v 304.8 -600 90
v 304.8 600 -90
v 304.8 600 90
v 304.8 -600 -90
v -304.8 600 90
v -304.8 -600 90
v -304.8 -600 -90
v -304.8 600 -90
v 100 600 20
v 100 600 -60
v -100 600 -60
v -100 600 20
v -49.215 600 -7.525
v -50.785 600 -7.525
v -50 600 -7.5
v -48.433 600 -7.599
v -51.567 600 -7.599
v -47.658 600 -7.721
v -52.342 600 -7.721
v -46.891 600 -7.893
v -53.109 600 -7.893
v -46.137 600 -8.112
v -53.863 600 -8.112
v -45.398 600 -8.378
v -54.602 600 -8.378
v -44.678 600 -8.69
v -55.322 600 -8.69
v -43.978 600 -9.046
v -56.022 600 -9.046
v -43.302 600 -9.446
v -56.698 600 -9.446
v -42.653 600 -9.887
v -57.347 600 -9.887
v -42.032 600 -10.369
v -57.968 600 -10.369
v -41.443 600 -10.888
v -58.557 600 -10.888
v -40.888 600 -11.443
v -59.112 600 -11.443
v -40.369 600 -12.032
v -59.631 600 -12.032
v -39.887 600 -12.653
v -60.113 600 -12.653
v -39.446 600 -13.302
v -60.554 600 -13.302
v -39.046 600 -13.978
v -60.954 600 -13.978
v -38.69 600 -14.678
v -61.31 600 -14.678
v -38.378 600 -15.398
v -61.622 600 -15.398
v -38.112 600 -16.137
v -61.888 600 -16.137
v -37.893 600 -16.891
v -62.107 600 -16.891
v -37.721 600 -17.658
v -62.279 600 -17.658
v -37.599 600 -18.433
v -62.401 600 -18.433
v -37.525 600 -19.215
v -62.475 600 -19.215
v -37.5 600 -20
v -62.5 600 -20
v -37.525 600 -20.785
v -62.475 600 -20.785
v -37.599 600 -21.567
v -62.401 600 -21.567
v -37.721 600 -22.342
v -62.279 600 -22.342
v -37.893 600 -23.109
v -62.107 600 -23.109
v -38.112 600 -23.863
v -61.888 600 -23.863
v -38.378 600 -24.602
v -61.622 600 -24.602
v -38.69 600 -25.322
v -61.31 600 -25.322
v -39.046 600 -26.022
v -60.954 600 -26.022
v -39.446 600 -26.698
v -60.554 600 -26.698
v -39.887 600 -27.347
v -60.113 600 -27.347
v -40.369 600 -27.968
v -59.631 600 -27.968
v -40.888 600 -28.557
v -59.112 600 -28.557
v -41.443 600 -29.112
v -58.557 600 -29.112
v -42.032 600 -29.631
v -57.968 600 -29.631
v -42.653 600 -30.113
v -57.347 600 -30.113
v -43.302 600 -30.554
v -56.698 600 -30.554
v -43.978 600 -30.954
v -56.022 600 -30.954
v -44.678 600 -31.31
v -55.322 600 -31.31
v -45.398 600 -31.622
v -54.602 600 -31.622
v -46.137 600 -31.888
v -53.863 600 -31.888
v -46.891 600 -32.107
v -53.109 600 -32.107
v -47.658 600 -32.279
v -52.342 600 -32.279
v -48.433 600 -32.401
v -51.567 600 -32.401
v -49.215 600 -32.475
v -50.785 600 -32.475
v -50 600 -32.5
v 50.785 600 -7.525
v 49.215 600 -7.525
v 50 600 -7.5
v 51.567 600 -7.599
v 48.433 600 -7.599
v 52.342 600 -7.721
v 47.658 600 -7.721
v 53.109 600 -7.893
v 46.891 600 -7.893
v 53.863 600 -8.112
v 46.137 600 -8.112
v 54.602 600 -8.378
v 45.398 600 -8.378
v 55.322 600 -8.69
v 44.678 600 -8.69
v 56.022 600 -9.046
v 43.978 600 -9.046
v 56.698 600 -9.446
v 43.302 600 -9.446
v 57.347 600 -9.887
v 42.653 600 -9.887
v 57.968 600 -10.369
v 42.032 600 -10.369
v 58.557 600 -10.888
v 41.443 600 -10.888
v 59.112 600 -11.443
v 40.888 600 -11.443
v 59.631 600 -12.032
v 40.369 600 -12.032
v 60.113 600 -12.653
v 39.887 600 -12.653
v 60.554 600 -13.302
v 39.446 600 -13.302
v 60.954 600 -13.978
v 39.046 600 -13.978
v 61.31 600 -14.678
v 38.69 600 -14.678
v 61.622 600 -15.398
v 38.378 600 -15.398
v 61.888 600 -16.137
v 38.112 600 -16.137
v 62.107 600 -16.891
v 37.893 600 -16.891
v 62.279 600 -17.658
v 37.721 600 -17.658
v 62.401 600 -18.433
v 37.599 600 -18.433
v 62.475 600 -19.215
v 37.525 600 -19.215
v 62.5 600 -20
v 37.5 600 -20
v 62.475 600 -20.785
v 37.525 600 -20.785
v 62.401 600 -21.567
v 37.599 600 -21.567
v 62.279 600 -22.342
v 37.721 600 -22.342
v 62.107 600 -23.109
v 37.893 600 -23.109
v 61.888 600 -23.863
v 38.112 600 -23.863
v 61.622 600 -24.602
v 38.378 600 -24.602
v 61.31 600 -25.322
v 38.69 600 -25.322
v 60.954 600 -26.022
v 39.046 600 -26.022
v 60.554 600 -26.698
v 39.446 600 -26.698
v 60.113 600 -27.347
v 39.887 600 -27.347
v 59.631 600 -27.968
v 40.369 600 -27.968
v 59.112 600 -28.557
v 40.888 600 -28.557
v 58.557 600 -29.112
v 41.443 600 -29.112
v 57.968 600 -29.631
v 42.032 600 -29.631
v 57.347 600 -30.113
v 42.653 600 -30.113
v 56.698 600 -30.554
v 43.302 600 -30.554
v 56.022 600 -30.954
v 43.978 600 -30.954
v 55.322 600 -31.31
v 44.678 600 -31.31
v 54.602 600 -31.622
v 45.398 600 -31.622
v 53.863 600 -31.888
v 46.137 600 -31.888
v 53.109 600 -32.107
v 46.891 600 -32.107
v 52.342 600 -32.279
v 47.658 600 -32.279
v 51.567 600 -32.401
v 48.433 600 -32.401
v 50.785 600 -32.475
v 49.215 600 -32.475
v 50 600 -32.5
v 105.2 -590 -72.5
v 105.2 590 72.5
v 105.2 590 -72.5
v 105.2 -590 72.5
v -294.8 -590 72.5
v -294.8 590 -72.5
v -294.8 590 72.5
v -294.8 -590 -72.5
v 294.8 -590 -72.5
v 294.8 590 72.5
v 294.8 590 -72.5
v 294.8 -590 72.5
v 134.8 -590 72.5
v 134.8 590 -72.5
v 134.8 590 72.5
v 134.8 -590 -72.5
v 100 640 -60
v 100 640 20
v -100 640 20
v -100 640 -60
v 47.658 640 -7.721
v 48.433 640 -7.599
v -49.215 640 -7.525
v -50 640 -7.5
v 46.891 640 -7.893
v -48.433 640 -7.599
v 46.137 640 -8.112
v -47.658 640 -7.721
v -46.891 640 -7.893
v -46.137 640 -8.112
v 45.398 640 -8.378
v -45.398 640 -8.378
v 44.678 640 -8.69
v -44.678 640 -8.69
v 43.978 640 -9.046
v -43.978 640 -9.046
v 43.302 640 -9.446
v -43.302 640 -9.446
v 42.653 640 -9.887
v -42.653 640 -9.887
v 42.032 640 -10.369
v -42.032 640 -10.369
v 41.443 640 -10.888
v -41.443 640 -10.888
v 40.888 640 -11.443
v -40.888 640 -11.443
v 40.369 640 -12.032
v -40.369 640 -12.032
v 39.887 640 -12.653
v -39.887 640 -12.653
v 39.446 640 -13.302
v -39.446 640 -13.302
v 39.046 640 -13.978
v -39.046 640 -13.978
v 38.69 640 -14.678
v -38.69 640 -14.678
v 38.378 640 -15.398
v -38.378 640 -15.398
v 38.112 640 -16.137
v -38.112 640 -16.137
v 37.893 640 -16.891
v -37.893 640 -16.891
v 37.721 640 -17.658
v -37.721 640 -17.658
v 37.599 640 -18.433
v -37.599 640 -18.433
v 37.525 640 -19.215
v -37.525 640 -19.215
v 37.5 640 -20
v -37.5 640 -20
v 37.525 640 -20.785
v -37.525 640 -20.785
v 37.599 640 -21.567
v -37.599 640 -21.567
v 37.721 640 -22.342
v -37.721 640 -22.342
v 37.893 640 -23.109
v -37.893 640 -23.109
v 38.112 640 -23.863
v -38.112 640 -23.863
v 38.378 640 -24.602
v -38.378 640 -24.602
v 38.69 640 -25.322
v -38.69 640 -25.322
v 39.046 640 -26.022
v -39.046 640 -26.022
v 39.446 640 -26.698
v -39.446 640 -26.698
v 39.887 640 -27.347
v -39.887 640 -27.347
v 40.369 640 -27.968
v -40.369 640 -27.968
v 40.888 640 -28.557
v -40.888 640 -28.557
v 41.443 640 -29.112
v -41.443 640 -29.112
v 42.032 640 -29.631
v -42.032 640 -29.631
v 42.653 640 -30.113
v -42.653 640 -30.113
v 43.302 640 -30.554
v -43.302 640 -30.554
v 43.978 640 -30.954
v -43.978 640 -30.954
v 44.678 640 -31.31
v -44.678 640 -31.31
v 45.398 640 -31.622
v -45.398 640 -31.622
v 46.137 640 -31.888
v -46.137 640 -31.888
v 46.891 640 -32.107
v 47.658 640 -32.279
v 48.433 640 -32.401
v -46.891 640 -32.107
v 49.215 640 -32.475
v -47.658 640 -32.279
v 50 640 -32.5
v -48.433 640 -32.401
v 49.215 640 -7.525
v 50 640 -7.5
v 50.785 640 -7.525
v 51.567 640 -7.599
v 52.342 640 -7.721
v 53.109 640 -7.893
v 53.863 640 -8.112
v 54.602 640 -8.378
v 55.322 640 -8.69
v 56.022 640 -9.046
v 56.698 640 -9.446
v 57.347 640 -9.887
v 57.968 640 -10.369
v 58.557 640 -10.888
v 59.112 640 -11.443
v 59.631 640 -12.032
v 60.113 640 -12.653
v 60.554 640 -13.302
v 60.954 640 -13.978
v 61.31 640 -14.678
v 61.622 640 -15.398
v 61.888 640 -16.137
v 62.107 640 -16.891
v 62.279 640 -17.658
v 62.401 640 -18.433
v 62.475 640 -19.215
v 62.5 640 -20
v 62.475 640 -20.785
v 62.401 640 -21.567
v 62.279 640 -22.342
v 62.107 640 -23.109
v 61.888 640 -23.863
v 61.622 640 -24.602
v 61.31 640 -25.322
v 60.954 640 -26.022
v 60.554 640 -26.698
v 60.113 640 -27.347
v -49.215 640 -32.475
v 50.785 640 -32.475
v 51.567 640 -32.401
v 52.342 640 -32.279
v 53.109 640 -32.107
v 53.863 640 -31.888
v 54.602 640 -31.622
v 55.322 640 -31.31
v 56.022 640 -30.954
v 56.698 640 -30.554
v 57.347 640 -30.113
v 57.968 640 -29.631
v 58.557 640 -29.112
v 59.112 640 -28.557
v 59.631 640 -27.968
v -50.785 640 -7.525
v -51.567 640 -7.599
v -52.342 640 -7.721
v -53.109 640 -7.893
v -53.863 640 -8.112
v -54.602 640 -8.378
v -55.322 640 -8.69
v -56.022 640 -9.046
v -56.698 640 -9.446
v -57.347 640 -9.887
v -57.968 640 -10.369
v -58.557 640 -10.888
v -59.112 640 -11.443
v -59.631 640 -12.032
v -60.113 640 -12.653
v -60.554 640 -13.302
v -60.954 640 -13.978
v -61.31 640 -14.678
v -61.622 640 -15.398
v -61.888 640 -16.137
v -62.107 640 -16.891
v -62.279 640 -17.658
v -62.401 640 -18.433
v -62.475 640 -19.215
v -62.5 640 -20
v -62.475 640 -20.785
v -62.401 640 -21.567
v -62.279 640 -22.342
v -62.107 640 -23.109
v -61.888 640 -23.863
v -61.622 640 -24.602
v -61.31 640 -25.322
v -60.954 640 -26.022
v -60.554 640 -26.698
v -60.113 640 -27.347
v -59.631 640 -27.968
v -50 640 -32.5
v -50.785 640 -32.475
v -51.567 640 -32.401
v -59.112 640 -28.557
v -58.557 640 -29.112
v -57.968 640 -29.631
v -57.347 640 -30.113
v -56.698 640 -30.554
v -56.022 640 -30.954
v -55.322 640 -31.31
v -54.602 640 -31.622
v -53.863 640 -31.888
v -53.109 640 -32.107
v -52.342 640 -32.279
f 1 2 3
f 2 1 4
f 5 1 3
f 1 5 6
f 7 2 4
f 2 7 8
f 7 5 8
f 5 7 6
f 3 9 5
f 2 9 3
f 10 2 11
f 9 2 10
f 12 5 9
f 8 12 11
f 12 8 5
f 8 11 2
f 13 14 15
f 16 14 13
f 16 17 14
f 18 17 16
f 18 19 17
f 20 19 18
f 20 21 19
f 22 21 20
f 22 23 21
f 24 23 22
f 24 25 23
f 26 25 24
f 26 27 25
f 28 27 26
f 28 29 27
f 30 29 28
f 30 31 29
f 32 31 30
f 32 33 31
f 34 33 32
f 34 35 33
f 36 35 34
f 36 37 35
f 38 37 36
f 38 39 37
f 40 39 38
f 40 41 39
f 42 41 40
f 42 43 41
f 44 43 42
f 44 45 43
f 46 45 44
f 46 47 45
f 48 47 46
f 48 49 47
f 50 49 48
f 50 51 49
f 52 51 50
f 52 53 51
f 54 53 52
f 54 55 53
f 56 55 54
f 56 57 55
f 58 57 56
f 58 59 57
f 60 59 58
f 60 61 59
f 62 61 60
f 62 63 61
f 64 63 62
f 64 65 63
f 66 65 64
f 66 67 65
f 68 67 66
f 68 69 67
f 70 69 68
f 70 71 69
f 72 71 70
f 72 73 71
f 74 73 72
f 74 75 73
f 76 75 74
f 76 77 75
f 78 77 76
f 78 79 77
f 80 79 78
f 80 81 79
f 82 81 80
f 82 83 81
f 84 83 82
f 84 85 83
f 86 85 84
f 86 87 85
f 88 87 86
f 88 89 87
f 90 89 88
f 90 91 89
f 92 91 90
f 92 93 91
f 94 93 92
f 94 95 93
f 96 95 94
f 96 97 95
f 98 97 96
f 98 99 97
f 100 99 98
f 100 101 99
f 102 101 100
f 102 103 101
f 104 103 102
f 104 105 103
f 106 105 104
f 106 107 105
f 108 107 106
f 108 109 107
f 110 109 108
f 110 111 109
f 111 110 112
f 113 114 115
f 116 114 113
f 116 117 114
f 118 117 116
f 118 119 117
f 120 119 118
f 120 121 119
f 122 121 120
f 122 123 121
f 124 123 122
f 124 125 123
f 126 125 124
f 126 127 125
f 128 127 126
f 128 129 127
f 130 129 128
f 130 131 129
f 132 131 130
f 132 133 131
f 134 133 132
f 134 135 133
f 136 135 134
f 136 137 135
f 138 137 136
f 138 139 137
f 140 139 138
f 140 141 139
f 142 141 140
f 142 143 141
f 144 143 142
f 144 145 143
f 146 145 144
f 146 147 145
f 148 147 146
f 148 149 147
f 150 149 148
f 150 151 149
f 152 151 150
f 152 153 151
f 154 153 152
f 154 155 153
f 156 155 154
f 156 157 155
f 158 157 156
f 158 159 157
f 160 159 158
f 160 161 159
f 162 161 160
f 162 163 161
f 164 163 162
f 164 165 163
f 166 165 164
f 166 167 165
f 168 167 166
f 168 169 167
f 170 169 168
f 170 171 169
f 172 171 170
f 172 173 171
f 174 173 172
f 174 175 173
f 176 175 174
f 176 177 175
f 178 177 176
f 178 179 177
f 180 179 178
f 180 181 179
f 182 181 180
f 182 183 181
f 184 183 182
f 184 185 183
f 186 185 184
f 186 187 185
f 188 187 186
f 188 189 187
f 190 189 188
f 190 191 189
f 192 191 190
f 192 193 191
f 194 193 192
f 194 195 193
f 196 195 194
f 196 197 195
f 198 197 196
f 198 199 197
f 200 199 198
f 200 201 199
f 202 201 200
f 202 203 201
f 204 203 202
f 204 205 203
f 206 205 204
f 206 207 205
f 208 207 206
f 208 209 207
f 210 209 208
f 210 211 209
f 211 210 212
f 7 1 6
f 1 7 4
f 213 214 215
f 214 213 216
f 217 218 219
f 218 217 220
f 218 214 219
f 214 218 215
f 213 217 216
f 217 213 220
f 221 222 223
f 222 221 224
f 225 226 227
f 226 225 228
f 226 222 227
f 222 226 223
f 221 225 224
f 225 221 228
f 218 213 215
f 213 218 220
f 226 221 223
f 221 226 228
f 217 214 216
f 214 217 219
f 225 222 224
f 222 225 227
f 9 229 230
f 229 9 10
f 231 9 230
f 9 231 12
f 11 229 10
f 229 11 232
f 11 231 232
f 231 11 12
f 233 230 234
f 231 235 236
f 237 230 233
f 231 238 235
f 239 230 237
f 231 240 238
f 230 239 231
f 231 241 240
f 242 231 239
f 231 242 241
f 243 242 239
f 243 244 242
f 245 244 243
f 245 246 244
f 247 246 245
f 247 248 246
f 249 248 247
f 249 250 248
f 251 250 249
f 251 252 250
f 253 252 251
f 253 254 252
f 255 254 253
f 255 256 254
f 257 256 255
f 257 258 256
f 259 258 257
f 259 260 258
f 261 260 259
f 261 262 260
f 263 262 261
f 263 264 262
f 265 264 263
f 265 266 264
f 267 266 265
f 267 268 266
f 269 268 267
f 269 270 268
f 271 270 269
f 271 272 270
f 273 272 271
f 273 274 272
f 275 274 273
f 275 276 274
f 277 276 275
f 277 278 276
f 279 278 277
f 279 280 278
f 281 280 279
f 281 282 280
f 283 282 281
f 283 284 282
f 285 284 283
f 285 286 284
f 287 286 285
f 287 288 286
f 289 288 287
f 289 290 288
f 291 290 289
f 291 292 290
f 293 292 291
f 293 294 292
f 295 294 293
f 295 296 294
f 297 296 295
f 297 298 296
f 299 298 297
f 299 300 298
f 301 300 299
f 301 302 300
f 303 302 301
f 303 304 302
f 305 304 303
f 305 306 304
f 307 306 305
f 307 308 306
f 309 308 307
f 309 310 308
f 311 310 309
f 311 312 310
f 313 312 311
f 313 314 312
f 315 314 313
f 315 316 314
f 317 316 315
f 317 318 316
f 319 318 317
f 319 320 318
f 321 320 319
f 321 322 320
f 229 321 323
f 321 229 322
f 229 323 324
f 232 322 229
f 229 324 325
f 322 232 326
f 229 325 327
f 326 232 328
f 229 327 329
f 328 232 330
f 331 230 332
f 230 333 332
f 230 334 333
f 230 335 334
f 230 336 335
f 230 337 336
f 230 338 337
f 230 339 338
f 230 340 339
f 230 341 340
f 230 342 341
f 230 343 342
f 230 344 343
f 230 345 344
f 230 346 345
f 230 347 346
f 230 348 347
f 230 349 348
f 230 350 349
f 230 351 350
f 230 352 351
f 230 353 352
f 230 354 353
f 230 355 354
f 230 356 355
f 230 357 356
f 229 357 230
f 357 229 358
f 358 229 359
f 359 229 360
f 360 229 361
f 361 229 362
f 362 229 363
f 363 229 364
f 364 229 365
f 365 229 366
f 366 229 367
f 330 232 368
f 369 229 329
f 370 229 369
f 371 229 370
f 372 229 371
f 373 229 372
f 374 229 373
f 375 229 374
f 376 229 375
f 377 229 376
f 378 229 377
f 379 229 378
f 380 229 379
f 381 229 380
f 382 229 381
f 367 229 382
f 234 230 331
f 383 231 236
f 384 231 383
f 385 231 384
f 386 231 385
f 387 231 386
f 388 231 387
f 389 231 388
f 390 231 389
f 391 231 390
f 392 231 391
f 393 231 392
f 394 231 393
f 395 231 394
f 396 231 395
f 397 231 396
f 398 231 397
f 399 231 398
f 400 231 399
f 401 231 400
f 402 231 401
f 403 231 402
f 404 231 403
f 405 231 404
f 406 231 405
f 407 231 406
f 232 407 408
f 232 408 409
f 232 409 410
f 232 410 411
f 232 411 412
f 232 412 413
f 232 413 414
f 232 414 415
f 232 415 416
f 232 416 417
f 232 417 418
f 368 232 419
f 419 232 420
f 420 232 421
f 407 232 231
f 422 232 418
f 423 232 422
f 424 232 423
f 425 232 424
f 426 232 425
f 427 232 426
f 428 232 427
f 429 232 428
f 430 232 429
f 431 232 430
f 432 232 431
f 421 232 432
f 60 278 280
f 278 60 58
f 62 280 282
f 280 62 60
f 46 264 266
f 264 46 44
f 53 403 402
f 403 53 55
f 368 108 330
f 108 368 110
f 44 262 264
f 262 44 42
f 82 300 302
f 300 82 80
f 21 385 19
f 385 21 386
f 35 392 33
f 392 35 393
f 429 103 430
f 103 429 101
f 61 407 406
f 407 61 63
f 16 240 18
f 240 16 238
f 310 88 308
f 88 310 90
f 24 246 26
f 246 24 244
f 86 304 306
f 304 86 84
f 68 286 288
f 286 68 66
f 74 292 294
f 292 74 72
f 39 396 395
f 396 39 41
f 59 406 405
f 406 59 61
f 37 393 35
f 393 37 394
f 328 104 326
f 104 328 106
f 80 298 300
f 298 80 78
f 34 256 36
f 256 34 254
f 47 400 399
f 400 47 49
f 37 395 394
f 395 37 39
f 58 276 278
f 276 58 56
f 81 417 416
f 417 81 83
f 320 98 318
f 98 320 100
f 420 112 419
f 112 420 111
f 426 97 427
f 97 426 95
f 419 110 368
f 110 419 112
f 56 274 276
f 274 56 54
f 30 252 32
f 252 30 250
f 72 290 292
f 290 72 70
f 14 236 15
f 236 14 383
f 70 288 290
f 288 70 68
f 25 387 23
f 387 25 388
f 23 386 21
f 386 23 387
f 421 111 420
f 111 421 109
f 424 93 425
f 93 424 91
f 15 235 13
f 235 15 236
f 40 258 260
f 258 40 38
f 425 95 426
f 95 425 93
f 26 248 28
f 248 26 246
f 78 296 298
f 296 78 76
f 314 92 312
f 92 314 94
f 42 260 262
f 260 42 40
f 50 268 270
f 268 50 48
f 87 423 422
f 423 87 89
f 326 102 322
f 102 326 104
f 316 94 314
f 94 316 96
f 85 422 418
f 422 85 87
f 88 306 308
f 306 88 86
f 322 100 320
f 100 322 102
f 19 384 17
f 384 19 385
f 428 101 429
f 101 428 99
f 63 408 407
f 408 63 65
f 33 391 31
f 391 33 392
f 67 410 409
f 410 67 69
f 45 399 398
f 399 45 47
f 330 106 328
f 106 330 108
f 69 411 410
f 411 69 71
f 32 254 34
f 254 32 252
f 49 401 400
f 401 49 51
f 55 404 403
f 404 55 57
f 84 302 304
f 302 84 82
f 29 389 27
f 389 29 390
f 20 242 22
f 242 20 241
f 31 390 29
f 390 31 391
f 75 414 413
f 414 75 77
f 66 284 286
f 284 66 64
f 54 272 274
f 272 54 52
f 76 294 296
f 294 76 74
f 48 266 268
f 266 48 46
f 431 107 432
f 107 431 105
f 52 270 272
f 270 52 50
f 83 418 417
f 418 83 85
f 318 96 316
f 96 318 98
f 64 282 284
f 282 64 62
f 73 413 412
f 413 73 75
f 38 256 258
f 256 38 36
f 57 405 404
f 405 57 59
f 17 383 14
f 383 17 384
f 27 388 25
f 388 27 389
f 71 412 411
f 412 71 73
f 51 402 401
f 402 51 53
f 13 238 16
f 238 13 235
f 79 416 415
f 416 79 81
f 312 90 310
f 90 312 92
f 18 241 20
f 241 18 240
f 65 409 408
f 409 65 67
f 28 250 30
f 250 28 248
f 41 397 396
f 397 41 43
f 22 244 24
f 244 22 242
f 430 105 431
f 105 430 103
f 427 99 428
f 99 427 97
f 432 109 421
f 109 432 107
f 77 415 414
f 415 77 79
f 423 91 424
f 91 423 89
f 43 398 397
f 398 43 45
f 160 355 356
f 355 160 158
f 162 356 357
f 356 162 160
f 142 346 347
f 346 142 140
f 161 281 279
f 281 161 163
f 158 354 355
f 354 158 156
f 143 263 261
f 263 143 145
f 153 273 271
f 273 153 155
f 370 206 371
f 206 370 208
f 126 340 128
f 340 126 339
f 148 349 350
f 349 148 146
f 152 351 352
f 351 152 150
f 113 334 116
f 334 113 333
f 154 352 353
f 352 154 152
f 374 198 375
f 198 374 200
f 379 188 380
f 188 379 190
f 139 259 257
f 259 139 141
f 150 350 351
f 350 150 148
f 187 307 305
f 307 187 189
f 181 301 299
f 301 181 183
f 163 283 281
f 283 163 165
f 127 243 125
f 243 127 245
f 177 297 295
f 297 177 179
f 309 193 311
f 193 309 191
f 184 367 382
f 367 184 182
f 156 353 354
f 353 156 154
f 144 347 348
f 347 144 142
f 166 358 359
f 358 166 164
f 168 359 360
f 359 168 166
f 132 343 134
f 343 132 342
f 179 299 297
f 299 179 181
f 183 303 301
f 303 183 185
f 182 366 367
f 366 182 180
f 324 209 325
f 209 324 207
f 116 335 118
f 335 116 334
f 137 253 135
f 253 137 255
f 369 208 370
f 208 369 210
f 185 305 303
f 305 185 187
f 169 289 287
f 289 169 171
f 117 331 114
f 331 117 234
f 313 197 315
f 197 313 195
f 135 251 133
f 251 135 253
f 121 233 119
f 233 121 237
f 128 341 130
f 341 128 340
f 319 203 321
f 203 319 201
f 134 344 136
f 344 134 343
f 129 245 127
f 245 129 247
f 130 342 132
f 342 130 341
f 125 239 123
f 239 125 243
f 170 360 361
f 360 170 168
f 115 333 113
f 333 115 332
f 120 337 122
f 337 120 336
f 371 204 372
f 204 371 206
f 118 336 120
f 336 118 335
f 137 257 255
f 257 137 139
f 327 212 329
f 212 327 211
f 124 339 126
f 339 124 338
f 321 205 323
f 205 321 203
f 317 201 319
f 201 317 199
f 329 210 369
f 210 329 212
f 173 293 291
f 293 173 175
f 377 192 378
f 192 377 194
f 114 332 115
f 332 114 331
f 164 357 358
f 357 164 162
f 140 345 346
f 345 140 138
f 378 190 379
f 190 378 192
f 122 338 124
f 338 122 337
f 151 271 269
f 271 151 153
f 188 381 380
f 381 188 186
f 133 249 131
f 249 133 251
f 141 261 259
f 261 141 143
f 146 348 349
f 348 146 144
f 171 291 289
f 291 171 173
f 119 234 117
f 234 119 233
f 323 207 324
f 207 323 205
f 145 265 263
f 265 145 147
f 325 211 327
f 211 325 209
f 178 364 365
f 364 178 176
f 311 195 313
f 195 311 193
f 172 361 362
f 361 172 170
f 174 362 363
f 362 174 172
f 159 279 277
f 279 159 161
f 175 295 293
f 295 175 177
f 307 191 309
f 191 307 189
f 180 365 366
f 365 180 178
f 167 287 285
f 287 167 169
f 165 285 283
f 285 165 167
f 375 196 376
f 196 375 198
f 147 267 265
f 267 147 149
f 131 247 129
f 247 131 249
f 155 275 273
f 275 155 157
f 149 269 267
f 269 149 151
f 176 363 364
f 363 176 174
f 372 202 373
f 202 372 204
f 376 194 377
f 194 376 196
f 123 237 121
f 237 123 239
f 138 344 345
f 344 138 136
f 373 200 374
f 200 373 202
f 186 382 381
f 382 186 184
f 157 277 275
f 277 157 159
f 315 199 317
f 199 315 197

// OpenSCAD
// ====================================================================================
// REVOLUTIONARY TECHNOLOGY COMPANY & UNIVERSITY OF WASHINGTON DEPARTMENT OF PHYSICS
// Subsystem: copo_hybrid_battery_pack.scad (Structural 800V Hybrid Energy Core)
// Core Specifications: RT-Certified Thermal Infrastructure / Multi-Chamber Shield
// Center Origin (0,0,0) = Geometric Centerpoint of the Underbelly Battery Pan
// ====================================================================================

$fn = 100; // High-precision CNC milling and waterjet cutting track paths

// --- Engineering Constants (mm) ---
inch_to_mm         = 25.4;
pack_total_length  = 1200.00;          // Spans between front and rear subframe rails
pack_total_width   = 609.60;           // Fits exactly inside the widebody frame rail envelope
pack_total_height  = 180.00;           // Low profile design to maximize underbody clearance
wall_thickness_ti  = 6.35;             // 1/4" Titanium Grade 5 structural crash protection walls

// Internal Chamber Partition Sizing (mm)
battery_cell_chamber_w = 400.00;      // Allocates space for 800V LiFePO4 cells
capacitor_array_w      = 160.00;       // Allocates space for the instant-discharge caps
vapor_chamber_height   = 15.00;        // 3D Vapor Chamber layer room for thermal management

module heavy_structural_battery_casing() {
    echo("MILLING HIGH-DENSITY STRUCTURAL PACK CASING WITH INTEGRATED VAPOR FLANGES");
    color("DimGrey") {
        difference() {
            // Main solid underbody hybrid power pack vault brick
            cube([pack_total_width, pack_total_length, pack_total_height], center=true);
            
            // 1. PRIMARY LITHIUM CELL CHAMBER VOLUME
            translate([-pack_total_width/2 + battery_cell_chamber_w/2 + 10, 0, 0])
                cube([battery_cell_chamber_w, pack_total_length - 20, pack_total_height - (2*wall_thickness_ti)], center=true);
                
            // 2. ISOLATED ULTRA-CAPACITOR DRIVE CHAMBER
            translate([pack_total_width/2 - capacitor_array_w/2 - 10, 0, 0])
                cube([capacitor_array_w, pack_total_length - 20, pack_total_height - (2*wall_thickness_ti)], center=true);
        }
    }
}

module rt_thermal_management_armor() {
    // Generates the horizontal multi-stage cooling lines and phase-change plate cavities
    color("Copper") {
        for (z_offset = [-pack_total_height/2 + 10, pack_total_height/2 - 10]) {
            translate([0, 0, z_offset])
                // RT Phase-Change cooling tracks extending horizontally to the radiator channels
                cube([pack_total_width - 12, pack_total_length - 12, vapor_chamber_height], center=true);
        }
    }
}

module external_inverter_outlet_bracket() {
    // Heavy-duty terminal block extension where the auxiliary 120V AC inverter links
    color("Silver") {
        translate([0, pack_total_length/2 + 20, -20]) {
            difference() {
                cube([200, 40, 80], center=true);
                // Pre-cut port pass-throughs for the thick 2oz/3oz high-draw copper output tracks
                translate([-50, 0, 0]) rotate([90, 0, 0]) cylinder(d=25, h=45, center=true);
                translate([50, 0, 0])  rotate([90, 0, 0]) cylinder(d=25, h=45, center=true);
            }
        }
    }
}

// --- Composite Structural Energy Vault Instantiation ---
union() {
    heavy_structural_battery_casing();
    rt_thermal_management_armor();
    external_inverter_outlet_bracket();
}
